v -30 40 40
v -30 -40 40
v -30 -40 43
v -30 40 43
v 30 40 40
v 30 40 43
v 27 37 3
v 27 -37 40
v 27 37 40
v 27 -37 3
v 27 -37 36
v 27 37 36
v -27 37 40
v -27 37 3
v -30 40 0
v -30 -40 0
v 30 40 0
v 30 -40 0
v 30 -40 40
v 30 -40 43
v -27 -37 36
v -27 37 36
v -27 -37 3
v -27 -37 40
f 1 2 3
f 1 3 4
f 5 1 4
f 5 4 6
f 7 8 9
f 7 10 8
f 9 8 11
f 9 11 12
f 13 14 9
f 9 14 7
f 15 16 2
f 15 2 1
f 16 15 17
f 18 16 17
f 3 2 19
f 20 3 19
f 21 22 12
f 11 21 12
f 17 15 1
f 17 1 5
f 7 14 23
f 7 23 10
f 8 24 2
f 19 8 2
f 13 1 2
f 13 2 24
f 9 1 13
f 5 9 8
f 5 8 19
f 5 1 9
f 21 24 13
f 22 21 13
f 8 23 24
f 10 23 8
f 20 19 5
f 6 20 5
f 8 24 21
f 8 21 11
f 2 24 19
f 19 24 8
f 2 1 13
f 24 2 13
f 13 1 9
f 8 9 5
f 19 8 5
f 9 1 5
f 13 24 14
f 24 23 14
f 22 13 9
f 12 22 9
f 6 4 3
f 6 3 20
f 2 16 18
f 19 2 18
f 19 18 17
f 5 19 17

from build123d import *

# Parameters (mm, degrees)
F0_W     = 60
F0_H     = 80
F1_DEPTH = 40
F2_T     = -3
F3_W     = 60
F3_H     = 80
F3_W_2   = 54
F3_H_2   = 74
F4_DEPTH = 3
F5_DEPTH = 4


with BuildPart() as f1:
    # F0 (on Top) → F1 (new body)
    with BuildSketch(Plane.XY):
        Rectangle(F0_W, F0_H)
    extrude(amount=F1_DEPTH)

    # F2
    f2_openings = [f1.faces().sort_by_distance(p)[0] for p in [
        (0, 0, 40),
    ]]
    offset(amount=F2_T, openings=f2_openings)


with BuildPart() as f4:
    # F3 (on face) → F4 (new body)
    with BuildSketch(Plane.XY.offset(40)):
        Rectangle(F3_W, F3_H)
        Rectangle(F3_W_2, F3_H_2, mode=Mode.SUBTRACT)
        Rectangle(F3_W_2, F3_H_2)
    extrude(amount=F4_DEPTH)

    # F3 (on face) → F5 (join)
    with BuildSketch(Plane.XY.offset(40)):
        Rectangle(F3_W_2, F3_H_2)
    extrude(amount=-F5_DEPTH)


solid = Compound([f1.part, f4.part])
